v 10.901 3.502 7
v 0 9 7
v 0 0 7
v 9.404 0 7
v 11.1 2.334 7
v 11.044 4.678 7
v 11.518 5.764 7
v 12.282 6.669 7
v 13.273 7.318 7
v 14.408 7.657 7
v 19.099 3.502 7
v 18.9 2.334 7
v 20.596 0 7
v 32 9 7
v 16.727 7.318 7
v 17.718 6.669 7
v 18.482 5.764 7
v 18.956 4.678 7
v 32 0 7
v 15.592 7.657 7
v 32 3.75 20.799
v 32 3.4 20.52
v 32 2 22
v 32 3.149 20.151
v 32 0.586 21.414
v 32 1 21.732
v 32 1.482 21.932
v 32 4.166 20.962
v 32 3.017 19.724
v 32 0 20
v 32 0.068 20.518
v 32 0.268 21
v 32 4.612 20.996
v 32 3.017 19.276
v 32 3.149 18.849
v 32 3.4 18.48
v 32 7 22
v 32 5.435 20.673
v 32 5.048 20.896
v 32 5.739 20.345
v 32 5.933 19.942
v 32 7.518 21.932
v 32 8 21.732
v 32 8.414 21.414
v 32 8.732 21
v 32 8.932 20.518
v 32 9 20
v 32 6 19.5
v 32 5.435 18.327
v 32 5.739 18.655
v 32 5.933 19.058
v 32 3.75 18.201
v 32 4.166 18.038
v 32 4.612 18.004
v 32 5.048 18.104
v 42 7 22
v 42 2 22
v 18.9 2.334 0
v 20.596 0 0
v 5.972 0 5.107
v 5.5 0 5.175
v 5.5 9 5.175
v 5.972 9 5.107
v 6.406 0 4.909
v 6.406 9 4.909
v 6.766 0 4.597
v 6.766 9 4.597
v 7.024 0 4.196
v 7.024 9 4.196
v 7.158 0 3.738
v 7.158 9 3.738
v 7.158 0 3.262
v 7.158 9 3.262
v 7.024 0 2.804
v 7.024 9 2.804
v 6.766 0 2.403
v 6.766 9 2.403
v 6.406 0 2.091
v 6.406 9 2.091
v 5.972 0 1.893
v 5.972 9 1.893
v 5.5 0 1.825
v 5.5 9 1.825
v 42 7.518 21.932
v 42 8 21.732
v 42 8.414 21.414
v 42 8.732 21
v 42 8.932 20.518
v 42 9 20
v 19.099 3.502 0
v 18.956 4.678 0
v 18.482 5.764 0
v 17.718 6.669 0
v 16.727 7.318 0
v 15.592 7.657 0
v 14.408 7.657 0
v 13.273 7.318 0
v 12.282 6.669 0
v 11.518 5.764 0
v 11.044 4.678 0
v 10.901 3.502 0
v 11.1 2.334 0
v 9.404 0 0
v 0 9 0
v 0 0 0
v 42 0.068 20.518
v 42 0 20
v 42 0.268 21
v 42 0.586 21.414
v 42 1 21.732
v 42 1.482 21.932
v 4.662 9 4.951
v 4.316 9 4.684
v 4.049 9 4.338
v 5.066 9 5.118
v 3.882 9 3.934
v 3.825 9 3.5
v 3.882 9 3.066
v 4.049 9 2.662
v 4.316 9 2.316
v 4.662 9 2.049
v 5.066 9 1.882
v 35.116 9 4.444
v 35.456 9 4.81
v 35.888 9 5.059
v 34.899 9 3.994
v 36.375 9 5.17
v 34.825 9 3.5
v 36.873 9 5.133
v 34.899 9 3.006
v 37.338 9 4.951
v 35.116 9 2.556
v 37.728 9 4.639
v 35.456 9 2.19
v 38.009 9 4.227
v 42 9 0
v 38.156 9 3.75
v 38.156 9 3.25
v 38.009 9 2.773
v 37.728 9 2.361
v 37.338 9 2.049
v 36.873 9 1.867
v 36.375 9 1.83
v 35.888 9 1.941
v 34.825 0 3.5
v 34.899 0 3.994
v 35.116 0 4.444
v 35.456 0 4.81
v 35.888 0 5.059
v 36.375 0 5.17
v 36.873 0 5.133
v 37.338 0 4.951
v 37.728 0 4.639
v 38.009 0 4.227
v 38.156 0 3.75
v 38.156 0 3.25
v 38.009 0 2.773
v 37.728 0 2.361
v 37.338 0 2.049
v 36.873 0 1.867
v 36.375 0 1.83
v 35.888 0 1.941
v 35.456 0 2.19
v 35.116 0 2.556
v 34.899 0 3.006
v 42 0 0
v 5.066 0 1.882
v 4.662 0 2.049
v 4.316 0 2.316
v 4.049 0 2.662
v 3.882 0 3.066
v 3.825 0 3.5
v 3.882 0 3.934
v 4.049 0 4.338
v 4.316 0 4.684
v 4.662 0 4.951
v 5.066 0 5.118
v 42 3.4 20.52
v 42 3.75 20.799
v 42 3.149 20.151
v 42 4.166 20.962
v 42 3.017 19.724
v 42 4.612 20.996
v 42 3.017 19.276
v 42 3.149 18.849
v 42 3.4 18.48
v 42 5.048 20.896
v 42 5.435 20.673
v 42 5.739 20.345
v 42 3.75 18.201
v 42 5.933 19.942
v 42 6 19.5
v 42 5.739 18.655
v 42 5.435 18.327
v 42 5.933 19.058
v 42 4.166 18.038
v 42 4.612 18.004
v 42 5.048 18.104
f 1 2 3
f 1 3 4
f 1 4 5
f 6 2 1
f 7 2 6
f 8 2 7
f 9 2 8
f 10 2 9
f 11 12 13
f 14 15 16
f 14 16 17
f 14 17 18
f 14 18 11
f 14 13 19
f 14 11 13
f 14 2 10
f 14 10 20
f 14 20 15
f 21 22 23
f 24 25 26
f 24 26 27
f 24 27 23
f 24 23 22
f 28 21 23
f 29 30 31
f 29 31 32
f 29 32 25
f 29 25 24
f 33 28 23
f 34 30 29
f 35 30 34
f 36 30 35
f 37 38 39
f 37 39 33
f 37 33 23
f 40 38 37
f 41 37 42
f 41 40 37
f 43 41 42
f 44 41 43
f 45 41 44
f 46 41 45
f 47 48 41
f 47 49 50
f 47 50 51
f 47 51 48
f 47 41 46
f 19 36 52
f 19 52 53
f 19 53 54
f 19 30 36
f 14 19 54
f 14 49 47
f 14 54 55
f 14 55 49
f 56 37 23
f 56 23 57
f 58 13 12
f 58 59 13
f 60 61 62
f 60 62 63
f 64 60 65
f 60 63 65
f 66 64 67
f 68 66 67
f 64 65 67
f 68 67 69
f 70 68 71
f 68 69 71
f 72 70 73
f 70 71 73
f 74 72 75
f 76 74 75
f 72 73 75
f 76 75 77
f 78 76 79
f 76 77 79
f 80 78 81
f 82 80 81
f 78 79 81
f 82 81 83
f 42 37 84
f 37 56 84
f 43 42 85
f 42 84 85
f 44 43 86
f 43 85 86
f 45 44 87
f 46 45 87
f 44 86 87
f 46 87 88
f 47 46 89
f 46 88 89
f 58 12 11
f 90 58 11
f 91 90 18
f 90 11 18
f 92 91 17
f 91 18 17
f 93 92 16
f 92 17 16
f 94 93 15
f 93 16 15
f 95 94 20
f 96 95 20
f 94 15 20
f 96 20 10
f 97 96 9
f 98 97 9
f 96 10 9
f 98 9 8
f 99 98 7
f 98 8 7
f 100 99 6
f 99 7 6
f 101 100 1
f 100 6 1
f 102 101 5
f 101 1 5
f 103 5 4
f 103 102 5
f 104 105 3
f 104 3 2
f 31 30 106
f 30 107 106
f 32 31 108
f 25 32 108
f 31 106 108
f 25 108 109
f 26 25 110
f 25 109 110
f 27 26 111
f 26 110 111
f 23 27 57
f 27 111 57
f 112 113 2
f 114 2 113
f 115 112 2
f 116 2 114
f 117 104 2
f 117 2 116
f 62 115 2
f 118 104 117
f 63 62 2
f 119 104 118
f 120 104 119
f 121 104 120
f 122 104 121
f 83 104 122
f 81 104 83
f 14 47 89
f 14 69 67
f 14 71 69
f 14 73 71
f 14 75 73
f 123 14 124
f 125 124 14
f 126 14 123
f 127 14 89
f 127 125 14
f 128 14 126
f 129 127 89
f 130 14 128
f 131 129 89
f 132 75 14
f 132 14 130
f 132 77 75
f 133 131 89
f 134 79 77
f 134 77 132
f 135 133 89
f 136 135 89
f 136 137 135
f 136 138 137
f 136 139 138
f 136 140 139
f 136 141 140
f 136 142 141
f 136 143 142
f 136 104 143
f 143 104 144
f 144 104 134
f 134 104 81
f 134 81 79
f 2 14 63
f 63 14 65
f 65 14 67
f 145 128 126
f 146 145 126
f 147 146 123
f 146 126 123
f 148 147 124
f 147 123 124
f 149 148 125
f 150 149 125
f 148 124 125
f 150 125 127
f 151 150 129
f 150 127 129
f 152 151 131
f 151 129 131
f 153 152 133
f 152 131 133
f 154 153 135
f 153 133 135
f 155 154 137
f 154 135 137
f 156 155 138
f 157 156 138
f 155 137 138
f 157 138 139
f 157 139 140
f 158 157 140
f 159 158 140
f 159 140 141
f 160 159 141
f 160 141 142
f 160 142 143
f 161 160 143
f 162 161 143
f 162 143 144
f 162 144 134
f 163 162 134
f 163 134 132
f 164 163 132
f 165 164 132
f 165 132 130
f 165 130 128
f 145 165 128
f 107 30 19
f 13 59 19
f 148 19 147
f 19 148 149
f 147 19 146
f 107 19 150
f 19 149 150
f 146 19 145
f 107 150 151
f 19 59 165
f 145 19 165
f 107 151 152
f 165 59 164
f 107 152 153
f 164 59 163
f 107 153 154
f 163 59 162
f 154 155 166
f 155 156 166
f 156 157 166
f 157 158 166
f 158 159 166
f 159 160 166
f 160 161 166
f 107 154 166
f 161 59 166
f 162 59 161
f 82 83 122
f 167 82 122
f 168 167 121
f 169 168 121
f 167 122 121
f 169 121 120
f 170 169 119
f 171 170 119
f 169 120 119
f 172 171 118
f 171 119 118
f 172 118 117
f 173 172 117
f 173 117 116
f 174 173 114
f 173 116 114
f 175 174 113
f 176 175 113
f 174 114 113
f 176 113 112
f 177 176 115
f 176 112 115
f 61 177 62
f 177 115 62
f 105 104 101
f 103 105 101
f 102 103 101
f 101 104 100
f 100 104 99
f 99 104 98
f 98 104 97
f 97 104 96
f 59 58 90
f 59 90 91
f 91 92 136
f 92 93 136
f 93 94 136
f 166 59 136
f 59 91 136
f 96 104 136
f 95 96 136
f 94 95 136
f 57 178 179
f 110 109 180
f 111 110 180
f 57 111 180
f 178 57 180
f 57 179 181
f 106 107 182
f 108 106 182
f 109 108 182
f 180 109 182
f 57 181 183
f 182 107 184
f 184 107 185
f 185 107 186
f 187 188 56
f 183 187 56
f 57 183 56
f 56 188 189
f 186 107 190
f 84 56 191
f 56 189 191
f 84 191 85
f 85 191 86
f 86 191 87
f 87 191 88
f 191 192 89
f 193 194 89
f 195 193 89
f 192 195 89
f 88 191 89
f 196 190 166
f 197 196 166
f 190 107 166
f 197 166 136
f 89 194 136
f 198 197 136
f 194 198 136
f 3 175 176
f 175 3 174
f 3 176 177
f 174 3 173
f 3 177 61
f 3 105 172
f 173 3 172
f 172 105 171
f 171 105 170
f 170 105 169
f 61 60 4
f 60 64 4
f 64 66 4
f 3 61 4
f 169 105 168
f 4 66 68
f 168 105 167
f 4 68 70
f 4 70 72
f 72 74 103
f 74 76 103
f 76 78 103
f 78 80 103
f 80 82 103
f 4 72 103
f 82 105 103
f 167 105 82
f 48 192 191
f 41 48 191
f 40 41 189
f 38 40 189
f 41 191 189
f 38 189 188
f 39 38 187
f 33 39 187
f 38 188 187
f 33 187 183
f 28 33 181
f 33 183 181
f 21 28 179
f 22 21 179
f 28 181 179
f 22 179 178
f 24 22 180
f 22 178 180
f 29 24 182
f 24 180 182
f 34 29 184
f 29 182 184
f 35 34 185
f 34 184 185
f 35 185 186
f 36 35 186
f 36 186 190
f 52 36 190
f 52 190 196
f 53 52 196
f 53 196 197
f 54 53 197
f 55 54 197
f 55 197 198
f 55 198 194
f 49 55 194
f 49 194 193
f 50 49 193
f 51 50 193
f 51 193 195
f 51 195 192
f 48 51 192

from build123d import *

# Parameters (mm, degrees)
F1_W        = 42
F1_H        = 9
F2_DEPTH    = 7
F3_R        = 4.1
F4_DEPTH    = 25
F5_T1_DEPTH = 26.0282480506
F7_DEPTH    = 25
F8_W        = 10
F8_H        = 9
F9_DEPTH    = 15
F10_R       = 1.5
F11_DEPTH   = 25
F12_R       = 2


# Not quite as in the source:
# - a fillet or chamfer that OpenCascade refuses, or shapes differently, is made with other operations: its cross-section is extruded or revolved along the edge and cut away or added


with BuildPart() as f2:
    # F1 (on Top) → F2 (new body)
    with BuildSketch(Plane.XY):
        with Locations((21, 4.5)):
            Rectangle(F1_W, F1_H)
    extrude(amount=F2_DEPTH)

    # F3 (on face) → F4 (cut)
    with BuildSketch(Plane.XY.offset(7)):
        with Locations((15, 3.6)):
            Circle(F3_R)
    extrude(amount=-F4_DEPTH, mode=Mode.SUBTRACT)

    # F5: chamfer of 7 on 2 edges, made by hand

    # F5_s2 → F5_t1 (cut)
    with BuildSketch(Plane.XY.offset(-9.5141240253)):
        with BuildLine():
            Line((20.7610452751, -0.2264961011), (18.73515334, 2.5608842714))
            Line((18.73515334, 2.5608842714), (18.6019903715, 2.6041002851))
            ThreePointArc((18.6019903715, 2.6041002851), (18.0707550937, 1.0995874031), (16.895141727, 0.1229268293))
            Line((16.895141727, 0.1229268293), (16.962141687, -0.14))
            ThreePointArc((16.962141687, -0.14), (18.861593481, -0.14), (20.7610452751, -0.3664961011))
            Line((20.7610452751, -0.3664961011), (20.7610452751, -0.2264961011))
        make_face()
        with BuildLine():
            Line((11.26484666, 2.5608842714), (9.2389547249, -0.2264961011))
            Line((9.2389547249, -0.2264961011), (9.2389547249, -0.3664961011))
            ThreePointArc((9.2389547249, -0.3664961011), (11.138406519, -0.14), (13.037858313, -0.14))
            Line((13.037858313, -0.14), (13.104858273, 0.1229268293))
            ThreePointArc((13.104858273, 0.1229268293), (11.9292449063, 1.0995874031), (11.3980096285, 2.6041002851))
            Line((11.3980096285, 2.6041002851), (11.26484666, 2.5608842714))
        make_face()
    extrude(amount=F5_T1_DEPTH, mode=Mode.SUBTRACT)

    # F6 (on face) → F7 (cut)
    with BuildSketch(Plane(origin=(0, 9, 0), x_dir=(-1, 0, 0), z_dir=(0, 1, 0))):
        with BuildLine():
            Line((-5.5, 3.5), (-3.825, 3.5))
            ThreePointArc((-3.825, 3.5), (-4.3155961415, 4.6844038585), (-5.5, 5.175))
            Line((-5.5, 5.175), (-5.5, 3.5))
        make_face()
        with BuildLine():
            ThreePointArc((-5.5, 1.825), (-4.3155961415, 2.3155961415), (-3.825, 3.5))
            Line((-3.825, 3.5), (-5.5, 3.5))
            Line((-5.5, 3.5), (-5.5, 1.825))
        make_face()
        with BuildLine():
            Line((-5.5, 3.5), (-5.5, 5.175))
            ThreePointArc((-5.5, 5.175), (-7.175, 3.5), (-5.5, 1.825))
            Line((-5.5, 1.825), (-5.5, 3.5))
        make_face()
        with BuildLine():
            ThreePointArc((-38.175, 3.5), (-36.5, 1.825), (-34.825, 3.5))
            ThreePointArc((-34.825, 3.5), (-36.5, 5.175), (-38.175, 3.5))
        make_face()
    extrude(amount=-F7_DEPTH, mode=Mode.SUBTRACT)

    # F8 (on face) → F9 (join)
    with BuildSketch(Plane.XY.offset(7)):
        with Locations((37, 4.5)):
            Rectangle(F8_W, F8_H)
    extrude(amount=F9_DEPTH)

    # F10 (on face) → F11 (cut)
    with BuildSketch(Plane.YZ.offset(42)):
        with Locations((4.5, 19.5)):
            Circle(F10_R)
    extrude(amount=-F11_DEPTH, mode=Mode.SUBTRACT)

    # F12
    f12_edges = [f2.edges().sort_by_distance(p)[0] for p in [
        (37, 0, 22),
        (37, 9, 22),
    ]]
    fillet(f12_edges, radius=F12_R)


solid = f2.part
